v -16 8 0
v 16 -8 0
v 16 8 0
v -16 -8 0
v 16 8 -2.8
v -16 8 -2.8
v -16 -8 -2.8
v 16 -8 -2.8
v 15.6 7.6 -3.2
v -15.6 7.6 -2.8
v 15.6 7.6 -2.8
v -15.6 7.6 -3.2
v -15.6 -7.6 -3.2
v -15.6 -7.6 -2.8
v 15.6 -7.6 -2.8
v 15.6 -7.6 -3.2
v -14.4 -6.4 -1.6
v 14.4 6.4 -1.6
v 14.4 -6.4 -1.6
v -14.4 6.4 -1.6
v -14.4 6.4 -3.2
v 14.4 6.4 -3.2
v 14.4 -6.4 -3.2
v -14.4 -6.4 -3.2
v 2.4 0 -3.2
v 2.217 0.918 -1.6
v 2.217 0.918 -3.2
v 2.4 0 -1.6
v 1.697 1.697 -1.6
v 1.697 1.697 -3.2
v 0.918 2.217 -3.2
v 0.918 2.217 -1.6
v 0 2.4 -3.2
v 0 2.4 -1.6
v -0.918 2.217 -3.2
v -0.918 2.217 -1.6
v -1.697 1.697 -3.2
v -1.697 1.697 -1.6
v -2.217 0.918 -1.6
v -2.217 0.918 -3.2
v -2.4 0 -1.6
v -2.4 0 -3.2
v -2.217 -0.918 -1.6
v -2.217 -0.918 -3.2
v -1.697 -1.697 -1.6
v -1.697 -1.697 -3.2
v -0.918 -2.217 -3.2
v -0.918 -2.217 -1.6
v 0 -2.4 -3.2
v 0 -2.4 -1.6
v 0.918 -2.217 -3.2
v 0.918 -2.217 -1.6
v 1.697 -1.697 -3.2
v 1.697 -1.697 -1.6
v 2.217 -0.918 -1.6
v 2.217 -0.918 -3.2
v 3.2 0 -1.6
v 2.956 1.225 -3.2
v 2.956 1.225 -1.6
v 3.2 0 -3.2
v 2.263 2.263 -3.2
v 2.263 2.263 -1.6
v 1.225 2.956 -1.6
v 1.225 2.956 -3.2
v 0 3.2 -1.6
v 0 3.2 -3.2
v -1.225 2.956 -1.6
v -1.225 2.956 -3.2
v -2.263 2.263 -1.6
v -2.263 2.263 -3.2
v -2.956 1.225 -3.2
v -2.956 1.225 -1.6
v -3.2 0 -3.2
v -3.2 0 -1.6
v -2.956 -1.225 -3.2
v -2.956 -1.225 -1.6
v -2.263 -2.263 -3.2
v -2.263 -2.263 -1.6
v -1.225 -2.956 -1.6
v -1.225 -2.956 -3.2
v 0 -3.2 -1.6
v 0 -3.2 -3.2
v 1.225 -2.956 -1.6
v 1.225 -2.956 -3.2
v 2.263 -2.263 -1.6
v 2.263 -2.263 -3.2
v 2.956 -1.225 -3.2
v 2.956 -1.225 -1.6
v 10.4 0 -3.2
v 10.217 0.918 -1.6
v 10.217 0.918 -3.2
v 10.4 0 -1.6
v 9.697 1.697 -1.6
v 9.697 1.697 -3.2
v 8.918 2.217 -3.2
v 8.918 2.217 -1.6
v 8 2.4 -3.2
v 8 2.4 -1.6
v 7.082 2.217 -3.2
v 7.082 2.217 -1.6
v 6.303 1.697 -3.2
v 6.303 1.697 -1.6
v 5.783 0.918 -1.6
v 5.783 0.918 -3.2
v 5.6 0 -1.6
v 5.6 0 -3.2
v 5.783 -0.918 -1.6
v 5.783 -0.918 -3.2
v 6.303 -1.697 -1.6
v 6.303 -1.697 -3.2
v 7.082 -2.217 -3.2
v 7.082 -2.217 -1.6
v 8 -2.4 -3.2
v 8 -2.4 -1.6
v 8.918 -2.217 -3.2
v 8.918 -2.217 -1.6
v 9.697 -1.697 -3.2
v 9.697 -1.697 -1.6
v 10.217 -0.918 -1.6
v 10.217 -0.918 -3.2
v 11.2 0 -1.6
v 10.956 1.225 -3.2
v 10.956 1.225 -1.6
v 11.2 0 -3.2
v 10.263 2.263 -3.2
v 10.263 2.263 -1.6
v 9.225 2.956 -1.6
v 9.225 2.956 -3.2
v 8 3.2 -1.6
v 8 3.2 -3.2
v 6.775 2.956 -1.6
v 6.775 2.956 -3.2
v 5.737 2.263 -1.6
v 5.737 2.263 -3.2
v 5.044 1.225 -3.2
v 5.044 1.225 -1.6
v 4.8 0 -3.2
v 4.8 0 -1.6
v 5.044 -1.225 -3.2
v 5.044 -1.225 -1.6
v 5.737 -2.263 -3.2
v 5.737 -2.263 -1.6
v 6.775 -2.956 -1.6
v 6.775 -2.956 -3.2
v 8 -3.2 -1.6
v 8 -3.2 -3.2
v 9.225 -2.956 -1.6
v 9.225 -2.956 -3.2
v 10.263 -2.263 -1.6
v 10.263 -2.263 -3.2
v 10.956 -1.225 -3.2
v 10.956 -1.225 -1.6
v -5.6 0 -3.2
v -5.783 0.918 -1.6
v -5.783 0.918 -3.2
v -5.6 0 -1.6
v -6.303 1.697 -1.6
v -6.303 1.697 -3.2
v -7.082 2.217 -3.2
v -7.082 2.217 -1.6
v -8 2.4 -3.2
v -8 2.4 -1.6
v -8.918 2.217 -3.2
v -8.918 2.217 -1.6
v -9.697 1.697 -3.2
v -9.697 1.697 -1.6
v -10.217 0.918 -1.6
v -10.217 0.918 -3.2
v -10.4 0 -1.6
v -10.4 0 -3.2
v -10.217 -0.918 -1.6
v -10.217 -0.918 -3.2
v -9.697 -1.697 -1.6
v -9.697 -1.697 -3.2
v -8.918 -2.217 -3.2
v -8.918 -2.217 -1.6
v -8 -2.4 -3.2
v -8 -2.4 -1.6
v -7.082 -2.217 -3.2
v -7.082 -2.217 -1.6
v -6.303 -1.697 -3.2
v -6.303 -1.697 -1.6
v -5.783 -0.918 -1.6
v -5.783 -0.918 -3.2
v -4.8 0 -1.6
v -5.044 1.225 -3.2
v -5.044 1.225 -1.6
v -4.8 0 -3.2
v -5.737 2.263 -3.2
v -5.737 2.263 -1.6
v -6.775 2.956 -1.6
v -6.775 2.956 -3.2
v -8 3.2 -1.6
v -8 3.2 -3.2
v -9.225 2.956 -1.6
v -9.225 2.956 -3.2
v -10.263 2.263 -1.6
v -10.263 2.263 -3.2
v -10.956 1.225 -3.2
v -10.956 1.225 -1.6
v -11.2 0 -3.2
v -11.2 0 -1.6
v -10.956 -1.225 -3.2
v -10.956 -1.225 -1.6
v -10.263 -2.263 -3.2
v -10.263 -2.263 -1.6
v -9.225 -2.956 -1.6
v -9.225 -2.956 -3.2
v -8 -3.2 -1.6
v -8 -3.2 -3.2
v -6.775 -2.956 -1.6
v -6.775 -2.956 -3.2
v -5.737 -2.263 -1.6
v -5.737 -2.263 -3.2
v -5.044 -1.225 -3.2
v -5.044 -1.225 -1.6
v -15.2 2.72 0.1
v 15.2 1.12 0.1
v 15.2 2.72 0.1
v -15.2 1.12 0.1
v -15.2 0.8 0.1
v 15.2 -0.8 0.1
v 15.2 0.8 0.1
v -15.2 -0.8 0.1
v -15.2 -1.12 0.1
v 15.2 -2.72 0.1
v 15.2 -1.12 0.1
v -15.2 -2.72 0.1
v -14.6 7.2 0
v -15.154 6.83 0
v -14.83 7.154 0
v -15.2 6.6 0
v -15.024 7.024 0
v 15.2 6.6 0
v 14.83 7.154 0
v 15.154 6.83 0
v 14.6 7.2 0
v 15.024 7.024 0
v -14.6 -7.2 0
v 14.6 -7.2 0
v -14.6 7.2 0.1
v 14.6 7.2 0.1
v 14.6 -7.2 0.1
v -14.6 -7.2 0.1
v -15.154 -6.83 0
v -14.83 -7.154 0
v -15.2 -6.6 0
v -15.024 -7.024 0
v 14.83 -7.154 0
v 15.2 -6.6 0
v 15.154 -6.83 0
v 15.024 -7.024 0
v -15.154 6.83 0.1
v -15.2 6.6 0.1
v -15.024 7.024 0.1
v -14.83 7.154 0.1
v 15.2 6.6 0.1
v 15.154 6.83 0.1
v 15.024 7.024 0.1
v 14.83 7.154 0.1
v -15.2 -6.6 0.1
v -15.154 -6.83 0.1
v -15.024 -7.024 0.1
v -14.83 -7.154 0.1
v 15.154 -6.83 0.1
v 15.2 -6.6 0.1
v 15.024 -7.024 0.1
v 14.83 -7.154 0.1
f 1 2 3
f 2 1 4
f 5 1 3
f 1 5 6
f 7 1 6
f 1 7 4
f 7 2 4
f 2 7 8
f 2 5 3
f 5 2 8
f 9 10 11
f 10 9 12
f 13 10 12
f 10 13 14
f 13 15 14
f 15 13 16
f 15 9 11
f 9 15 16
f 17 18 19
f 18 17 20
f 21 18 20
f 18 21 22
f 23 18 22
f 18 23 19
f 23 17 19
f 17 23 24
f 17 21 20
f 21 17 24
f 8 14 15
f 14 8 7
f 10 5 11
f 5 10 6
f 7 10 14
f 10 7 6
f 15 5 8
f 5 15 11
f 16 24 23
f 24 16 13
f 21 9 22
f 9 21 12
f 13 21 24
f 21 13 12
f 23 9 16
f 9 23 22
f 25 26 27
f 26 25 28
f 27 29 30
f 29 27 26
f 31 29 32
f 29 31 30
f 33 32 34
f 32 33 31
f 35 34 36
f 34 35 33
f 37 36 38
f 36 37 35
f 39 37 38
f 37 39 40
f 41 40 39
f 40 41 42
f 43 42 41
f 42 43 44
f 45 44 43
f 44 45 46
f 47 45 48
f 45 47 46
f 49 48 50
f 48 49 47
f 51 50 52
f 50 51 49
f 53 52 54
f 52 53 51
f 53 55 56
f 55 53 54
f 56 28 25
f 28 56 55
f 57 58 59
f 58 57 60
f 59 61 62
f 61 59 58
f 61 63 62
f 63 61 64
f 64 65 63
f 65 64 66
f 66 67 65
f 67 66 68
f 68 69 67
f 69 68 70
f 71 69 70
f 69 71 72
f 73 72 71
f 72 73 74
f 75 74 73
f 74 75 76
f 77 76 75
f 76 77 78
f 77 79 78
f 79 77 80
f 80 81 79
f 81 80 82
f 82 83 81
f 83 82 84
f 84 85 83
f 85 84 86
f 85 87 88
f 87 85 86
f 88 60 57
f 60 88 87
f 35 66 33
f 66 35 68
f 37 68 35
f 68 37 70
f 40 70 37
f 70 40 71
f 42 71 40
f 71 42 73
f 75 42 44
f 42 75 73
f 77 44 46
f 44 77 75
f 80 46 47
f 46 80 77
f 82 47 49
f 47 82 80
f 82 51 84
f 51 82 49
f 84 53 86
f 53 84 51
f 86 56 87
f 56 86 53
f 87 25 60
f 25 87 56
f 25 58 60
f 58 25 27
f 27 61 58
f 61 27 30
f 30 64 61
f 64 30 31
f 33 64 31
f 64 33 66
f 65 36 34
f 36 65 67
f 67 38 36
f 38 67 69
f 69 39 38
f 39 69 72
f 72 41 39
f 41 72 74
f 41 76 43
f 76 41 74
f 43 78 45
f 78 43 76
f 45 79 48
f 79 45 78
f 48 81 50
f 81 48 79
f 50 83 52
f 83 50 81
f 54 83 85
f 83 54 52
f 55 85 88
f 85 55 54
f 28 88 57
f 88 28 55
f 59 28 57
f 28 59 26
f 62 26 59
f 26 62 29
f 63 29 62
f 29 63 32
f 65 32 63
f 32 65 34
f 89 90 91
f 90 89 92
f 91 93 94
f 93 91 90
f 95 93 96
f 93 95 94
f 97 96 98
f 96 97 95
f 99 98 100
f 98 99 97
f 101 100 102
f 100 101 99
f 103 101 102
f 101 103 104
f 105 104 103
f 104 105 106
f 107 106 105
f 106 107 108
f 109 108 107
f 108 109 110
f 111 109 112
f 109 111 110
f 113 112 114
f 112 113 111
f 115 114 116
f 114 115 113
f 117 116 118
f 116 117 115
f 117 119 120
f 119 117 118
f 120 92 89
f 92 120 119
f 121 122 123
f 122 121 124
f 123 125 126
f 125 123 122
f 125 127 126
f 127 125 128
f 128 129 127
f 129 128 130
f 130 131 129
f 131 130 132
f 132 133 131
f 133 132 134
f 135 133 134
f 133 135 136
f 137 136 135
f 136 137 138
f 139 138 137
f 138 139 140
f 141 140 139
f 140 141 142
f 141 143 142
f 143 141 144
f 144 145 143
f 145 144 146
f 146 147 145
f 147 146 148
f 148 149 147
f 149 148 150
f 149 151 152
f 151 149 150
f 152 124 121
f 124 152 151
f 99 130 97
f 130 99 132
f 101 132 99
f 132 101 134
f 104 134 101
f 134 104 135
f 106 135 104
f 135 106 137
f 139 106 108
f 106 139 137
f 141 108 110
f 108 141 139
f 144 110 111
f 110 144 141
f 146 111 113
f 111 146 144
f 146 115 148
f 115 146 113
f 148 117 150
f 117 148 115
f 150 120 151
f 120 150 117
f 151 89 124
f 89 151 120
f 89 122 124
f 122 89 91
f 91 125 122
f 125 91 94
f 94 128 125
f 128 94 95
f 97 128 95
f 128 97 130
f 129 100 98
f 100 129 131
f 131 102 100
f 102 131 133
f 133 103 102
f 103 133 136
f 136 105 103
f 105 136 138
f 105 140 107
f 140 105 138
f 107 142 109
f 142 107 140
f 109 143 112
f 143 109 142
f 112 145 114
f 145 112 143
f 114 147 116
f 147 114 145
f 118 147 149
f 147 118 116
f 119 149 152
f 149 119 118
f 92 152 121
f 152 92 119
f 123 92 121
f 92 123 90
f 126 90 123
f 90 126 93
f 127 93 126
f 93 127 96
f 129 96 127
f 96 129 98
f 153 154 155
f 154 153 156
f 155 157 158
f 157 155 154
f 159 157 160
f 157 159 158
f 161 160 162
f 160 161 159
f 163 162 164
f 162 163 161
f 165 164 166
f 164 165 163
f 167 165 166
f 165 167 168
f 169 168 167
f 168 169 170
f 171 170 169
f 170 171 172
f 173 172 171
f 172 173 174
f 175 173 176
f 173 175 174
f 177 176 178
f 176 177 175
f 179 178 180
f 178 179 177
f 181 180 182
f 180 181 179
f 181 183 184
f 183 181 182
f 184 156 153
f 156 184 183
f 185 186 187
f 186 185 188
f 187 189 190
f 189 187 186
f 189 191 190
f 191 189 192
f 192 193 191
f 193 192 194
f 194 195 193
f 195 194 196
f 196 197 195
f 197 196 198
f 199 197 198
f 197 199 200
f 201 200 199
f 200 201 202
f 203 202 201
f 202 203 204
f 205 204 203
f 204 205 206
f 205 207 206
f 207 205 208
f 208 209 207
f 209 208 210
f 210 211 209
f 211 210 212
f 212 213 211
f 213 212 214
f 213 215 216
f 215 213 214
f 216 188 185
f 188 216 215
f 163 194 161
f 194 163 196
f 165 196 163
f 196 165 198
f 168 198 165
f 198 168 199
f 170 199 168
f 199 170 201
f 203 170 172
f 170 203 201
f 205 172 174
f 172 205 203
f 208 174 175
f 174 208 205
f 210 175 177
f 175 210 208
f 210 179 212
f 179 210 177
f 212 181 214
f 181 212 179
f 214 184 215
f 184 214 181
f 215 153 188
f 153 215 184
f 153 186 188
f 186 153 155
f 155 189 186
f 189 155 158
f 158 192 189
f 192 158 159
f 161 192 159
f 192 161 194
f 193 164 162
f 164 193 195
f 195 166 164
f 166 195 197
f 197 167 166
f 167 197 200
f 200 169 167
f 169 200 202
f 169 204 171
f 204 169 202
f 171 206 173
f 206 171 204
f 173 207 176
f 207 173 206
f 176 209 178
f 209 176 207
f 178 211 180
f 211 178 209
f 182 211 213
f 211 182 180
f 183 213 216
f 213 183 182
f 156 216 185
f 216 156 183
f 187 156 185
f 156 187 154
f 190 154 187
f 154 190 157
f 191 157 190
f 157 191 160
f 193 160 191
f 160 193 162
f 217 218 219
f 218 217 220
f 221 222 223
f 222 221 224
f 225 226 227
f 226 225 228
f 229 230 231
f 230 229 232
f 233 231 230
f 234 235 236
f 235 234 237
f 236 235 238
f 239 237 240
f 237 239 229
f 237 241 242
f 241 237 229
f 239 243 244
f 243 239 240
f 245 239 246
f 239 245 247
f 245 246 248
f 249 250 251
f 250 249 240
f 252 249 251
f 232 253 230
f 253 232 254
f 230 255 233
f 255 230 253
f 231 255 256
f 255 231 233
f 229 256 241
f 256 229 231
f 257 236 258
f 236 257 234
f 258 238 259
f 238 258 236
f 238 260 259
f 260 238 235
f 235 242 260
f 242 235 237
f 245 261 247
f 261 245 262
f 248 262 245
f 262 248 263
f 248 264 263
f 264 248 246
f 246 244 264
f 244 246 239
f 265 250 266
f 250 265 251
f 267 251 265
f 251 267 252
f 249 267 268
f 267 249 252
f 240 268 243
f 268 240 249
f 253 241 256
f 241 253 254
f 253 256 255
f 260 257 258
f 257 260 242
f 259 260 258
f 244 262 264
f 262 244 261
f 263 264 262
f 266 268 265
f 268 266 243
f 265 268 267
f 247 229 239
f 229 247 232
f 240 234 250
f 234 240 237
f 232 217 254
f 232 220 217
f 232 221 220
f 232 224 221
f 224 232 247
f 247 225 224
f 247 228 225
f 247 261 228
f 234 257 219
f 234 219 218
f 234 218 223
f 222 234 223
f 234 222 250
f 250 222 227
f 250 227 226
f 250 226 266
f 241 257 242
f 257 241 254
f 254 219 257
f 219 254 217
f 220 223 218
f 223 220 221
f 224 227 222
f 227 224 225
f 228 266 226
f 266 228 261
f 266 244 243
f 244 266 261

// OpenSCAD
// file: ../p/4-4ring3.scad
use <../lib.scad>
$fa=1; $fs=0.2;
function ldraw_lib__4_4ring3(realsolid=false) = [
// 0 Ring  3 x 1.0
// 0 Name: 4-4ring3.dat
// 0 Author: James Jessiman
// 0 !LDRAW_ORG Primitive UPDATE 2009-01
// 0 !LICENSE Licensed under CC BY 2.0 and CC BY 4.0 : see CAreadme.txt
// 
// 0 BFC CERTIFY CCW
  [0,"BFC","CERTIFY"],
  [0,"BFC","CCW"],
// 
// 0 !HISTORY 1998-12-15 [PTadmin] Official Update 1998-10
// 0 !HISTORY 2002-04-05 [hafhead] Added BFC statement
// 0 !HISTORY 2002-04-25 [PTadmin] Official Update 2002-02
// 0 !HISTORY 2007-06-24 [PTadmin] Header formatted for Contributor Agreement
// 0 !HISTORY 2008-07-01 [PTadmin] Official Update 2008-01
// 0 !HISTORY 2008-08-26 [cwdee] Switch polygon winding and rename
// 0 !HISTORY 2009-05-02 [PTadmin] Official Update 2009-01
// 
// 
// 4 16 -1.5308 0 3.6956 -1.1481 0 2.7717 0 0 3 0 0 4
  [4,16,-1.5308,0,3.6956,-1.1481,0,2.7717,0,0,3,0,0,4],
// 4 16 -2.8284 0 2.8284 -2.1213 0 2.1213 -1.1481 0 2.7717 -1.5308 0 3.6956
  [4,16,-2.8284,0,2.8284,-2.1213,0,2.1213,-1.1481,0,2.7717,-1.5308,0,3.6956],
// 4 16 -3.6956 0 1.5308 -2.7717 0 1.1481 -2.1213 0 2.1213 -2.8284 0 2.8284
  [4,16,-3.6956,0,1.5308,-2.7717,0,1.1481,-2.1213,0,2.1213,-2.8284,0,2.8284],
// 4 16 -4 0 0 -3 0 0 -2.7717 0 1.1481 -3.6956 0 1.5308
  [4,16,-4,0,0,-3,0,0,-2.7717,0,1.1481,-3.6956,0,1.5308],
// 4 16 -3.6956 0 -1.5308 -2.7717 0 -1.1481 -3 0 0 -4 0 0
  [4,16,-3.6956,0,-1.5308,-2.7717,0,-1.1481,-3,0,0,-4,0,0],
// 4 16 -2.8284 0 -2.8284 -2.1213 0 -2.1213 -2.7717 0 -1.1481 -3.6956 0 -1.5308
  [4,16,-2.8284,0,-2.8284,-2.1213,0,-2.1213,-2.7717,0,-1.1481,-3.6956,0,-1.5308],
// 4 16 -1.5308 0 -3.6956 -1.1481 0 -2.7717 -2.1213 0 -2.1213 -2.8284 0 -2.8284
  [4,16,-1.5308,0,-3.6956,-1.1481,0,-2.7717,-2.1213,0,-2.1213,-2.8284,0,-2.8284],
// 4 16 0 0 -4 0 0 -3 -1.1481 0 -2.7717 -1.5308 0 -3.6956
  [4,16,0,0,-4,0,0,-3,-1.1481,0,-2.7717,-1.5308,0,-3.6956],
// 4 16 1.5308 0 -3.6956 1.1481 0 -2.7717 0 0 -3 0 0 -4
  [4,16,1.5308,0,-3.6956,1.1481,0,-2.7717,0,0,-3,0,0,-4],
// 4 16 2.8284 0 -2.8284 2.1213 0 -2.1213 1.1481 0 -2.7717 1.5308 0 -3.6956
  [4,16,2.8284,0,-2.8284,2.1213,0,-2.1213,1.1481,0,-2.7717,1.5308,0,-3.6956],
// 4 16 3.6956 0 -1.5308 2.7717 0 -1.1481 2.1213 0 -2.1213 2.8284 0 -2.8284
  [4,16,3.6956,0,-1.5308,2.7717,0,-1.1481,2.1213,0,-2.1213,2.8284,0,-2.8284],
// 4 16 4 0 0 3 0 0 2.7717 0 -1.1481 3.6956 0 -1.5308
  [4,16,4,0,0,3,0,0,2.7717,0,-1.1481,3.6956,0,-1.5308],
// 4 16 3.6956 0 1.5308 2.7717 0 1.1481 3 0 0 4 0 0
  [4,16,3.6956,0,1.5308,2.7717,0,1.1481,3,0,0,4,0,0],
// 4 16 2.8284 0 2.8284 2.1213 0 2.1213 2.7717 0 1.1481 3.6956 0 1.5308
  [4,16,2.8284,0,2.8284,2.1213,0,2.1213,2.7717,0,1.1481,3.6956,0,1.5308],
// 4 16 1.5308 0 3.6956 1.1481 0 2.7717 2.1213 0 2.1213 2.8284 0 2.8284
  [4,16,1.5308,0,3.6956,1.1481,0,2.7717,2.1213,0,2.1213,2.8284,0,2.8284],
// 4 16 0 0 4 0 0 3 1.1481 0 2.7717 1.5308 0 3.6956
  [4,16,0,0,4,0,0,3,1.1481,0,2.7717,1.5308,0,3.6956],
// 0
];
module ldraw_lib__4_4ring3(step=0, col=false, unit=2/5, alt=false, line=0.2, solid=!$preview)
    makepoly(ldraw_lib__4_4ring3(solid), step=step, col=col, unit=unit, alt=alt, line=line, solid=solid);
ldraw_lib__4_4ring3(line=0.2);
// file: ../p/4-4edge.scad
use <../lib.scad>
function ldraw_lib__4_4edge() = [
// 0 Circle 1.0
// 0 Name: 4-4edge.dat
// 0 Author: James Jessiman
// 0 !LDRAW_ORG Primitive UPDATE 2017-01
// 0 !LICENSE Licensed under CC BY 2.0 and CC BY 4.0 : see CAreadme.txt
// 
// 0 BFC CERTIFY CCW
  [0,"BFC","CERTIFY"],
  [0,"BFC","CCW"],
// 
// 0 !HISTORY 1998-12-15 [PTadmin] Official Update 1998-10
// 0 !HISTORY 2005-12-28 [PTadmin] Official Update 2005-01
// 0 !HISTORY 2007-06-24 [PTadmin] Header formatted for Contributor Agreement
// 0 !HISTORY 2008-07-01 [PTadmin] Official Update 2008-01
// 0 !HISTORY 2017-01-15 [Steffen] BFCed
// 0 !HISTORY 2017-12-30 [PTadmin] Official Update 2017-01
// 
// 
// 2 24 1 0 0 0.9239 0 0.3827
  [2,24,1,0,0,0.9239,0,0.3827],
// 2 24 0.9239 0 0.3827 0.7071 0 0.7071
  [2,24,0.9239,0,0.3827,0.7071,0,0.7071],
// 2 24 0.7071 0 0.7071 0.3827 0 0.9239
  [2,24,0.7071,0,0.7071,0.3827,0,0.9239],
// 2 24 0.3827 0 0.9239 0 0 1
  [2,24,0.3827,0,0.9239,0,0,1],
// 2 24 0 0 1 -0.3827 0 0.9239
  [2,24,0,0,1,-0.3827,0,0.9239],
// 2 24 -0.3827 0 0.9239 -0.7071 0 0.7071
  [2,24,-0.3827,0,0.9239,-0.7071,0,0.7071],
// 2 24 -0.7071 0 0.7071 -0.9239 0 0.3827
  [2,24,-0.7071,0,0.7071,-0.9239,0,0.3827],
// 2 24 -0.9239 0 0.3827 -1 0 -0
  [2,24,-0.9239,0,0.3827,-1,0,-0],
// 2 24 -1 0 -0 -0.9239 0 -0.3827
  [2,24,-1,0,-0,-0.9239,0,-0.3827],
// 2 24 -0.9239 0 -0.3827 -0.7071 0 -0.7071
  [2,24,-0.9239,0,-0.3827,-0.7071,0,-0.7071],
// 2 24 -0.7071 0 -0.7071 -0.3827 0 -0.9239
  [2,24,-0.7071,0,-0.7071,-0.3827,0,-0.9239],
// 2 24 -0.3827 0 -0.9239 0 0 -1
  [2,24,-0.3827,0,-0.9239,0,0,-1],
// 2 24 0 0 -1 0.3827 0 -0.9239
  [2,24,0,0,-1,0.3827,0,-0.9239],
// 2 24 0.3827 0 -0.9239 0.7071 0 -0.7071
  [2,24,0.3827,0,-0.9239,0.7071,0,-0.7071],
// 2 24 0.7071 0 -0.7071 0.9239 0 -0.3827
  [2,24,0.7071,0,-0.7071,0.9239,0,-0.3827],
// 2 24 0.9239 0 -0.3827 1 0 0
  [2,24,0.9239,0,-0.3827,1,0,0],
];
module ldraw_lib__4_4edge(step=0, col=false, unit=2/5, alt=false, line=0.2, solid=!$preview)
    makepoly(ldraw_lib__4_4edge(), step=step, col=col, unit=unit, alt=alt, line=line, solid=solid);
ldraw_lib__4_4edge(line=0.2);
// file: ../p/4-4cyli.scad
use <../lib.scad>
$fa=1; $fs=0.2;
function ldraw_lib__4_4cyli(realsolid=false) = [
// 0 Cylinder 1.0
// 0 Name: 4-4cyli.dat
// 0 Author: James Jessiman
// 0 !LDRAW_ORG Primitive UPDATE 2005-01
// 0 !LICENSE Licensed under CC BY 2.0 and CC BY 4.0 : see CAreadme.txt
// 
// 0 BFC CERTIFY CCW
  [0,"BFC","CERTIFY"],
  [0,"BFC","CCW"],
// 
// 0 !HISTORY 1998-12-15 [PTadmin] Official Update 1998-10
// 0 !HISTORY 2002-03-23 [sbliss] Added BFC statement; merged headers from files in distributions LDraw 0.27 and Complete.
// 0 !HISTORY 2002-04-25 [PTadmin] Official Update 2002-02
// 0 !HISTORY 2004-12-14 [guyvivan] BFC CCW
// 0 !HISTORY 2005-12-28 [PTadmin] Official Update 2005-01
// 0 !HISTORY 2007-06-24 [PTadmin] Header formatted for Contributor Agreement
// 0 !HISTORY 2008-07-01 [PTadmin] Official Update 2008-01
// 
// 
// 4 16 1 1 0 0.9239 1 0.3827 0.9239 0 0.3827 1 0 0
  [4,16,1,1,0,0.9239,1,0.3827,0.9239,0,0.3827,1,0,0],
// 5 24 1 0 0 1 1 0 0.9239 0 0.3827 0.9239 0 -0.3827
  [5,24,1,0,0,1,1,0,0.9239,0,0.3827,0.9239,0,-0.3827],
// 4 16 0.9239 1 0.3827 0.7071 1 0.7071 0.7071 0 0.7071 0.9239 0 0.3827
  [4,16,0.9239,1,0.3827,0.7071,1,0.7071,0.7071,0,0.7071,0.9239,0,0.3827],
// 5 24 0.9239 0 0.3827 0.9239 1 0.3827 0.7071 0 0.7071 1 0 0
  [5,24,0.9239,0,0.3827,0.9239,1,0.3827,0.7071,0,0.7071,1,0,0],
// 4 16 0.7071 1 0.7071 0.3827 1 0.9239 0.3827 0 0.9239 0.7071 0 0.7071
  [4,16,0.7071,1,0.7071,0.3827,1,0.9239,0.3827,0,0.9239,0.7071,0,0.7071],
// 5 24 0.7071 0 0.7071 0.7071 1 0.7071 0.3827 0 0.9239 0.9239 0 0.3827
  [5,24,0.7071,0,0.7071,0.7071,1,0.7071,0.3827,0,0.9239,0.9239,0,0.3827],
// 4 16 0.3827 1 0.9239 0 1 1 0 0 1 0.3827 0 0.9239
  [4,16,0.3827,1,0.9239,0,1,1,0,0,1,0.3827,0,0.9239],
// 5 24 0.3827 0 0.9239 0.3827 1 0.9239 0 0 1 0.7071 0 0.7071
  [5,24,0.3827,0,0.9239,0.3827,1,0.9239,0,0,1,0.7071,0,0.7071],
// 4 16 0 1 1 -0.3827 1 0.9239 -0.3827 0 0.9239 0 0 1
  [4,16,0,1,1,-0.3827,1,0.9239,-0.3827,0,0.9239,0,0,1],
// 5 24 0 0 1 0 1 1 -0.3827 0 0.9239 0.3827 0 0.9239
  [5,24,0,0,1,0,1,1,-0.3827,0,0.9239,0.3827,0,0.9239],
// 4 16 -0.3827 1 0.9239 -0.7071 1 0.7071 -0.7071 0 0.7071 -0.3827 0 0.9239
  [4,16,-0.3827,1,0.9239,-0.7071,1,0.7071,-0.7071,0,0.7071,-0.3827,0,0.9239],
// 5 24 -0.3827 0 0.9239 -0.3827 1 0.9239 -0.7071 0 0.7071 0 0 1
  [5,24,-0.3827,0,0.9239,-0.3827,1,0.9239,-0.7071,0,0.7071,0,0,1],
// 4 16 -0.7071 1 0.7071 -0.9239 1 0.3827 -0.9239 0 0.3827 -0.7071 0 0.7071
  [4,16,-0.7071,1,0.7071,-0.9239,1,0.3827,-0.9239,0,0.3827,-0.7071,0,0.7071],
// 5 24 -0.7071 0 0.7071 -0.7071 1 0.7071 -0.9239 0 0.3827 -0.3827 0 0.9239
  [5,24,-0.7071,0,0.7071,-0.7071,1,0.7071,-0.9239,0,0.3827,-0.3827,0,0.9239],
// 4 16 -0.9239 1 0.3827 -1 1 0 -1 0 0 -0.9239 0 0.3827
  [4,16,-0.9239,1,0.3827,-1,1,0,-1,0,0,-0.9239,0,0.3827],
// 5 24 -0.9239 0 0.3827 -0.9239 1 0.3827 -1 0 0 -0.7071 0 0.7071
  [5,24,-0.9239,0,0.3827,-0.9239,1,0.3827,-1,0,0,-0.7071,0,0.7071],
// 4 16 -1 1 0 -0.9239 1 -0.3827 -0.9239 0 -0.3827 -1 0 0
  [4,16,-1,1,0,-0.9239,1,-0.3827,-0.9239,0,-0.3827,-1,0,0],
// 5 24 -1 0 0 -1 1 0 -0.9239 0 -0.3827 -0.9239 0 0.3827
  [5,24,-1,0,0,-1,1,0,-0.9239,0,-0.3827,-0.9239,0,0.3827],
// 4 16 -0.9239 1 -0.3827 -0.7071 1 -0.7071 -0.7071 0 -0.7071 -0.9239 0 -0.3827
  [4,16,-0.9239,1,-0.3827,-0.7071,1,-0.7071,-0.7071,0,-0.7071,-0.9239,0,-0.3827],
// 5 24 -0.9239 0 -0.3827 -0.9239 1 -0.3827 -0.7071 0 -0.7071 -1 0 0
  [5,24,-0.9239,0,-0.3827,-0.9239,1,-0.3827,-0.7071,0,-0.7071,-1,0,0],
// 4 16 -0.7071 1 -0.7071 -0.3827 1 -0.9239 -0.3827 0 -0.9239 -0.7071 0 -0.7071
  [4,16,-0.7071,1,-0.7071,-0.3827,1,-0.9239,-0.3827,0,-0.9239,-0.7071,0,-0.7071],
// 5 24 -0.7071 0 -0.7071 -0.7071 1 -0.7071 -0.3827 0 -0.9239 -0.9239 0 -0.3827
  [5,24,-0.7071,0,-0.7071,-0.7071,1,-0.7071,-0.3827,0,-0.9239,-0.9239,0,-0.3827],
// 4 16 -0.3827 1 -0.9239 0 1 -1 0 0 -1 -0.3827 0 -0.9239
  [4,16,-0.3827,1,-0.9239,0,1,-1,0,0,-1,-0.3827,0,-0.9239],
// 5 24 -0.3827 0 -0.9239 -0.3827 1 -0.9239 0 0 -1 -0.7071 0 -0.7071
  [5,24,-0.3827,0,-0.9239,-0.3827,1,-0.9239,0,0,-1,-0.7071,0,-0.7071],
// 4 16 0 1 -1 0.3827 1 -0.9239 0.3827 0 -0.9239 0 0 -1
  [4,16,0,1,-1,0.3827,1,-0.9239,0.3827,0,-0.9239,0,0,-1],
// 5 24 0 0 -1 0 1 -1 0.3827 0 -0.9239 -0.3827 0 -0.9239
  [5,24,0,0,-1,0,1,-1,0.3827,0,-0.9239,-0.3827,0,-0.9239],
// 4 16 0.3827 1 -0.9239 0.7071 1 -0.7071 0.7071 0 -0.7071 0.3827 0 -0.9239
  [4,16,0.3827,1,-0.9239,0.7071,1,-0.7071,0.7071,0,-0.7071,0.3827,0,-0.9239],
// 5 24 0.3827 0 -0.9239 0.3827 1 -0.9239 0.7071 0 -0.7071 0 0 -1
  [5,24,0.3827,0,-0.9239,0.3827,1,-0.9239,0.7071,0,-0.7071,0,0,-1],
// 4 16 0.7071 1 -0.7071 0.9239 1 -0.3827 0.9239 0 -0.3827 0.7071 0 -0.7071
  [4,16,0.7071,1,-0.7071,0.9239,1,-0.3827,0.9239,0,-0.3827,0.7071,0,-0.7071],
// 5 24 0.7071 0 -0.7071 0.7071 1 -0.7071 0.9239 0 -0.3827 0.3827 0 -0.9239
  [5,24,0.7071,0,-0.7071,0.7071,1,-0.7071,0.9239,0,-0.3827,0.3827,0,-0.9239],
// 4 16 0.9239 1 -0.3827 1 1 0 1 0 0 0.9239 0 -0.3827
  [4,16,0.9239,1,-0.3827,1,1,0,1,0,0,0.9239,0,-0.3827],
// 5 24 0.9239 0 -0.3827 0.9239 1 -0.3827 1 0 0 0.7071 0 -0.7071
  [5,24,0.9239,0,-0.3827,0.9239,1,-0.3827,1,0,0,0.7071,0,-0.7071],
// 0
];
module ldraw_lib__4_4cyli(step=0, col=false, unit=2/5, alt=false, line=0.2, solid=!$preview)
    makepoly(ldraw_lib__4_4cyli(solid), step=step, col=col, unit=unit, alt=alt, line=line, solid=solid);
ldraw_lib__4_4cyli(line=0.2);
// file: ../p/stud4.scad
use <../lib.scad>
use <4-4cyli.scad>
use <4-4edge.scad>
use <4-4ring3.scad>
function ldraw_lib__stud4() = [
// 0 Stud Tube Open
// 0 Name: stud4.dat
// 0 Author: James Jessiman
// 0 !LDRAW_ORG Primitive UPDATE 2009-02
// 0 !LICENSE Licensed under CC BY 4.0 : see CAreadme.txt
// 
// 0 BFC CERTIFY CCW
  [0,"BFC","CERTIFY"],
  [0,"BFC","CCW"],
// 
// 0 !HISTORY 1999-07-05 [PTadmin] Official Update 1999-05
// 0 !HISTORY 2002-04-04 [sbliss] Modified for BFC compliance
// 0 !HISTORY 2002-04-25 [PTadmin] Official Update 2002-02
// 0 !HISTORY 2007-06-24 [PTadmin] Header formatted for Contributor Agreement
// 0 !HISTORY 2008-07-01 [PTadmin] Official Update 2008-01
// 0 !HISTORY 2009-06-21 [cwdee] Update ring references to 4-4ring
// 0 !HISTORY 2009-09-03 [PTadmin] Official Update 2009-02
// 
// 
// 1 16 0 -4 0 6 0 0 0 1 0 0 0 6 4-4edge.dat
  [1,16,0,-4,0,6,0,0,0,1,0,0,0,6, ldraw_lib__4_4edge()],
// 1 16 0 -4 0 8 0 0 0 1 0 0 0 8 4-4edge.dat
  [1,16,0,-4,0,8,0,0,0,1,0,0,0,8, ldraw_lib__4_4edge()],
// 1 16 0 0 0 6 0 0 0 1 0 0 0 6 4-4edge.dat
  [1,16,0,0,0,6,0,0,0,1,0,0,0,6, ldraw_lib__4_4edge()],
// 1 16 0 0 0 8 0 0 0 1 0 0 0 8 4-4edge.dat
  [1,16,0,0,0,8,0,0,0,1,0,0,0,8, ldraw_lib__4_4edge()],
// 0 BFC INVERTNEXT
  [0,"BFC","INVERTNEXT"],
// 1 16 0 -4 0 6 0 0 0 4 0 0 0 6 4-4cyli.dat
  [1,16,0,-4,0,6,0,0,0,4,0,0,0,6, ldraw_lib__4_4cyli()],
// 1 16 0 -4 0 8 0 0 0 4 0 0 0 8 4-4cyli.dat
  [1,16,0,-4,0,8,0,0,0,4,0,0,0,8, ldraw_lib__4_4cyli()],
// 1 16 0 -4 0 2 0 0 0 1 0 0 0 2 4-4ring3.dat
  [1,16,0,-4,0,2,0,0,0,1,0,0,0,2, ldraw_lib__4_4ring3()],
  [-1,16,0,0,0,2,0,0,0,-1,0,0,0,2, ldraw_lib__4_4ring3()],
// 0
];
module ldraw_lib__stud4(step=0, col=false, unit=2/5, alt=false, line=0.2, solid=!$preview)
    makepoly(ldraw_lib__stud4(), step=step, col=col, unit=unit, alt=alt, line=line, solid=solid);
ldraw_lib__stud4(line=0.2);
// file: ../p/box5.scad
use <../lib.scad>
function ldraw_lib__box5() = [
// 0 Box with 5 Faces and All Edges
// 0 Name: box5.dat
// 0 Author: James Jessiman
// 0 !LDRAW_ORG Primitive UPDATE 2012-01
// 0 !LICENSE Licensed under CC BY 2.0 and CC BY 4.0 : see CAreadme.txt
// 
// 0 BFC CERTIFY CCW
  [0,"BFC","CERTIFY"],
  [0,"BFC","CCW"],
// 
// 0 !HISTORY 2002-04-03 [sbliss] Modified for BFC compliance
// 0 !HISTORY 2002-04-25 [PTadmin] Official Update 2002-02
// 0 !HISTORY 2007-06-24 [PTadmin] Header formatted for Contributor Agreement
// 0 !HISTORY 2008-07-01 [PTadmin] Official Update 2008-01
// 0 !HISTORY 2012-02-16 [Philo] Changed to CCW
// 0 !HISTORY 2012-03-30 [PTadmin] Official Update 2012-01
// 
// 
// 2 24 1 1 1 -1 1 1
  [2,24,1,1,1,-1,1,1],
// 2 24 -1 1 1 -1 1 -1
  [2,24,-1,1,1,-1,1,-1],
// 2 24 -1 1 -1 1 1 -1
  [2,24,-1,1,-1,1,1,-1],
// 2 24 1 1 -1 1 1 1
  [2,24,1,1,-1,1,1,1],
// 2 24 1 0 1 -1 0 1
  [2,24,1,0,1,-1,0,1],
// 2 24 -1 0 1 -1 0 -1
  [2,24,-1,0,1,-1,0,-1],
// 2 24 -1 0 -1 1 0 -1
  [2,24,-1,0,-1,1,0,-1],
// 2 24 1 0 -1 1 0 1
  [2,24,1,0,-1,1,0,1],
// 2 24 1 0 1 1 1 1
  [2,24,1,0,1,1,1,1],
// 2 24 -1 0 1 -1 1 1
  [2,24,-1,0,1,-1,1,1],
// 2 24 1 0 -1 1 1 -1
  [2,24,1,0,-1,1,1,-1],
// 2 24 -1 0 -1 -1 1 -1
  [2,24,-1,0,-1,-1,1,-1],
// 4 16 -1 1 1 1 1 1 1 1 -1 -1 1 -1
  [4,16,-1,1,1,1,1,1,1,1,-1,-1,1,-1],
// 4 16 -1 1 1 -1 0 1 1 0 1 1 1 1
  [4,16,-1,1,1,-1,0,1,1,0,1,1,1,1],
// 4 16 -1 1 -1 -1 0 -1 -1 0 1 -1 1 1
  [4,16,-1,1,-1,-1,0,-1,-1,0,1,-1,1,1],
// 4 16 1 1 -1 1 0 -1 -1 0 -1 -1 1 -1
  [4,16,1,1,-1,1,0,-1,-1,0,-1,-1,1,-1],
// 4 16 1 1 1 1 0 1 1 0 -1 1 1 -1
  [4,16,1,1,1,1,0,1,1,0,-1,1,1,-1],
];
makepoly(ldraw_lib__box5(), line=0.2);
// file: ../p/box4.scad
use <../lib.scad>
function ldraw_lib__box4() = [
// 0 Box with 4 Faces (2 Parallel Pairs) and All Edges
// 0 Name: box4.dat
// 0 Author: James Jessiman
// 0 !LDRAW_ORG Primitive UPDATE 2012-01
// 0 !LICENSE Licensed under CC BY 4.0 : see CAreadme.txt
// 
// 0 BFC CERTIFY CCW
  [0,"BFC","CERTIFY"],
  [0,"BFC","CCW"],
// 
// 0 !HISTORY 2002-04-03 [sbliss] Modified for BFC compliance
// 0 !HISTORY 2002-04-25 [PTadmin] Official Update 2002-02
// 0 !HISTORY 2007-06-24 [PTadmin] Header formatted for Contributor Agreement
// 0 !HISTORY 2008-07-01 [PTadmin] Official Update 2008-01
// 0 !HISTORY 2012-02-16 [Philo] Changed to CCW
// 0 !HISTORY 2012-03-30 [PTadmin] Official Update 2012-01
// 
// 
// 2 24 1 1 1 -1 1 1
  [2,24,1,1,1,-1,1,1],
// 2 24 -1 1 1 -1 1 -1
  [2,24,-1,1,1,-1,1,-1],
// 2 24 -1 1 -1 1 1 -1
  [2,24,-1,1,-1,1,1,-1],
// 2 24 1 1 -1 1 1 1
  [2,24,1,1,-1,1,1,1],
// 2 24 1 0 1 -1 0 1
  [2,24,1,0,1,-1,0,1],
// 2 24 -1 0 1 -1 0 -1
  [2,24,-1,0,1,-1,0,-1],
// 2 24 -1 0 -1 1 0 -1
  [2,24,-1,0,-1,1,0,-1],
// 2 24 1 0 -1 1 0 1
  [2,24,1,0,-1,1,0,1],
// 2 24 1 0 1 1 1 1
  [2,24,1,0,1,1,1,1],
// 2 24 -1 0 1 -1 1 1
  [2,24,-1,0,1,-1,1,1],
// 2 24 1 0 -1 1 1 -1
  [2,24,1,0,-1,1,1,-1],
// 2 24 -1 0 -1 -1 1 -1
  [2,24,-1,0,-1,-1,1,-1],
// 4 16 -1 1 1 -1 0 1 1 0 1 1 1 1
  [4,16,-1,1,1,-1,0,1,1,0,1,1,1,1],
// 4 16 -1 1 -1 -1 0 -1 -1 0 1 -1 1 1
  [4,16,-1,1,-1,-1,0,-1,-1,0,1,-1,1,1],
// 4 16 1 1 -1 1 0 -1 -1 0 -1 -1 1 -1
  [4,16,1,1,-1,1,0,-1,-1,0,-1,-1,1,-1],
// 4 16 1 1 1 1 0 1 1 0 -1 1 1 -1
  [4,16,1,1,1,1,0,1,1,0,-1,1,1,-1],
];
module ldraw_lib__box4(step=0, col=false, unit=2/5, alt=false, line=0.2, solid=!$preview)
    makepoly(ldraw_lib__box4(), step=step, col=col, unit=unit, alt=alt, line=line, solid=solid);
ldraw_lib__box4(line=0.2);
// file: s/87079s01.scad
use <../../lib.scad>
use <../../p/box4.scad>
use <../../p/box5.scad>
use <../../p/stud4.scad>
function ldraw_lib__s__87079s01() = [
// 0 ~Tile  2 x  4 with Groove without Top
// 0 Name: s\87079s01.dat
// 0 Author: Philippe Hurbain [Philo]
// 0 !LDRAW_ORG Subpart UPDATE 2012-03
// 0 !LICENSE Licensed under CC BY 4.0 : see CAreadme.txt
// 
// 0 BFC CERTIFY CCW
  [0,"BFC","CERTIFY"],
  [0,"BFC","CCW"],
// 
// 0 !HISTORY 2012-09-30 [Philo] Subparted from Tim Gould's original design
// 0 !HISTORY 2012-12-28 [PTadmin] Official Update 2012-03
// 
// 
// 1 16 0 0 0 40 0 0 0 7 0 0 0 20 box4.dat
  [1,16,0,0,0,40,0,0,0,7,0,0,0,20, ldraw_lib__box4()],
// 1 16 0 7 0 39 0 0 0 1 0 0 0 19 box4.dat
  [1,16,0,7,0,39,0,0,0,1,0,0,0,19, ldraw_lib__box4()],
// 0 BFC INVERTNEXT
  [0,"BFC","INVERTNEXT"],
// 1 16 0 8 0 -36 0 0 0 -4 0 0 0 16 box5.dat
  [1,16,0,8,0,-36,0,0,0,-4,0,0,0,16, ldraw_lib__box5()],
// 4 16 -40 7 -20 -39 7 -19 39 7 -19 40 7 -20
  [4,16,-40,7,-20,-39,7,-19,39,7,-19,40,7,-20],
// 4 16 40 7 20 39 7 19 -39 7 19 -40 7 20
  [4,16,40,7,20,39,7,19,-39,7,19,-40,7,20],
// 4 16 -40 7 -20 -40 7 20 -39 7 19 -39 7 -19
  [4,16,-40,7,-20,-40,7,20,-39,7,19,-39,7,-19],
// 4 16 40 7 20 40 7 -20 39 7 -19 39 7 19
  [4,16,40,7,20,40,7,-20,39,7,-19,39,7,19],
// 4 16 -39 8 -19 -36 8 -16 36 8 -16 39 8 -19
  [4,16,-39,8,-19,-36,8,-16,36,8,-16,39,8,-19],
// 4 16 39 8 19 36 8 16 -36 8 16 -39 8 19
  [4,16,39,8,19,36,8,16,-36,8,16,-39,8,19],
// 4 16 -39 8 -19 -39 8 19 -36 8 16 -36 8 -16
  [4,16,-39,8,-19,-39,8,19,-36,8,16,-36,8,-16],
// 4 16 39 8 19 39 8 -19 36 8 -16 36 8 16
  [4,16,39,8,19,39,8,-19,36,8,-16,36,8,16],
// 1 16 0 4 0 1 0 0 0 -1 0 0 0 1 stud4.dat
  [1,16,0,4,0,1,0,0,0,-1,0,0,0,1, ldraw_lib__stud4()],
// 1 16 20 4 0 1 0 0 0 -1 0 0 0 1 stud4.dat
  [1,16,20,4,0,1,0,0,0,-1,0,0,0,1, ldraw_lib__stud4()],
// 1 16 -20 4 0 1 0 0 0 -1 0 0 0 1 stud4.dat
  [1,16,-20,4,0,1,0,0,0,-1,0,0,0,1, ldraw_lib__stud4()],
];
module ldraw_lib__s__87079s01(step=0, col=false, unit=2/5, alt=false, line=0.2, solid=!$preview)
    makepoly(ldraw_lib__s__87079s01(), step=step, col=col, unit=unit, alt=alt, line=line, solid=solid);
ldraw_lib__s__87079s01(line=0.2);
// file: ../p/box3u12.scad
use <../lib.scad>
function ldraw_lib__box3u12() = [
// 0 Box with 3 Parallel Faces without Any Edges
// 0 Name: box3u12.dat
// 0 Author: J.C. Tchang [tchang]
// 0 !LDRAW_ORG Primitive UPDATE 2014-02
// 0 !LICENSE Licensed under CC BY 2.0 and CC BY 4.0 : see CAreadme.txt
// 
// 0 BFC CERTIFY CCW
  [0,"BFC","CERTIFY"],
  [0,"BFC","CCW"],
// 
// 0 !HISTORY 2014-12-23 [PTadmin] Official Update 2014-02
// 
// 
// 4 16 -1 1 1 1 1 1 1 1 -1 -1 1 -1
  [4,16,-1,1,1,1,1,1,1,1,-1,-1,1,-1],
// 4 16 -1 1 1 -1 0 1 1 0 1 1 1 1
  [4,16,-1,1,1,-1,0,1,1,0,1,1,1,1],
// 4 16 1 1 -1 1 0 -1 -1 0 -1 -1 1 -1
  [4,16,1,1,-1,1,0,-1,-1,0,-1,-1,1,-1],
];
makepoly(ldraw_lib__box3u12(), line=0.2);
// file: ../p/1-4cyli.scad
use <../lib.scad>
function ldraw_lib__1_4cyli() = [
// 0 Cylinder 0.25
// 0 Name: 1-4cyli.dat
// 0 Author: James Jessiman
// 0 !LDRAW_ORG Primitive UPDATE 2012-01
// 0 !LICENSE Licensed under CC BY 2.0 and CC BY 4.0 : see CAreadme.txt
// 
// 0 BFC CERTIFY CCW
  [0,"BFC","CERTIFY"],
  [0,"BFC","CCW"],
// 
// 0 !HISTORY 2002-03-23 [sbliss] Added BFC statement.
// 0 !HISTORY 2002-04-25 [PTadmin] Official Update 2002-02
// 0 !HISTORY 2007-06-22 [PTadmin] Header formatted for Contributor Agreement
// 0 !HISTORY 2008-07-01 [PTadmin] Official Update 2008-01
// 0 !HISTORY 2012-02-16 [Philo] Changed to CCW
// 0 !HISTORY 2012-03-30 [PTadmin] Official Update 2012-01
// 
// 
// 4 16 1 1 0 0.9239 1 0.3827 0.9239 0 0.3827 1 0 0
  [4,16,1,1,0,0.9239,1,0.3827,0.9239,0,0.3827,1,0,0],
// 5 24 1 0 0 1 1 0 0.9239 0 0.3827 1 0 -1
  [5,24,1,0,0,1,1,0,0.9239,0,0.3827,1,0,-1],
// 4 16 0.9239 1 0.3827 0.7071 1 0.7071 0.7071 0 0.7071 0.9239 0 0.3827
  [4,16,0.9239,1,0.3827,0.7071,1,0.7071,0.7071,0,0.7071,0.9239,0,0.3827],
// 5 24 0.9239 0 0.3827 0.9239 1 0.3827 0.7071 0 0.7071 1 0 0
  [5,24,0.9239,0,0.3827,0.9239,1,0.3827,0.7071,0,0.7071,1,0,0],
// 4 16 0.7071 1 0.7071 0.3827 1 0.9239 0.3827 0 0.9239 0.7071 0 0.7071
  [4,16,0.7071,1,0.7071,0.3827,1,0.9239,0.3827,0,0.9239,0.7071,0,0.7071],
// 5 24 0.7071 0 0.7071 0.7071 1 0.7071 0.3827 0 0.9239 0.9239 0 0.3827
  [5,24,0.7071,0,0.7071,0.7071,1,0.7071,0.3827,0,0.9239,0.9239,0,0.3827],
// 4 16 0.3827 1 0.9239 0 1 1 0 0 1 0.3827 0 0.9239
  [4,16,0.3827,1,0.9239,0,1,1,0,0,1,0.3827,0,0.9239],
// 5 24 0.3827 0 0.9239 0.3827 1 0.9239 0 0 1 0.7071 0 0.7071
  [5,24,0.3827,0,0.9239,0.3827,1,0.9239,0,0,1,0.7071,0,0.7071],
// 5 24 0 0 1 0 1 1 0.3827 0 0.9239 -1 0 1
  [5,24,0,0,1,0,1,1,0.3827,0,0.9239,-1,0,1],
];
module ldraw_lib__1_4cyli(step=0, col=false, unit=2/5, alt=false, line=0.2, solid=!$preview)
    makepoly(ldraw_lib__1_4cyli(), step=step, col=col, unit=unit, alt=alt, line=line, solid=solid);
ldraw_lib__1_4cyli(line=0.2);
// file: ../p/1-4chrd.scad
use <../lib.scad>
$fa=1; $fs=0.2;
function ldraw_lib__1_4chrd(realsolid=false) = [
// 0 Chord 0.25
// 0 Name: 1-4chrd.dat
// 0 Author: Tony Hafner [hafhead]
// 0 !LDRAW_ORG Primitive UPDATE 2012-02
// 0 !LICENSE Licensed under CC BY 2.0 and CC BY 4.0 : see CAreadme.txt
// 
// 0 BFC CERTIFY CCW
  [0,"BFC","CERTIFY"],
  [0,"BFC","CCW"],
// 
// 0 !HISTORY 2004-04-22 [PTadmin] Official Update 2004-02
// 0 !HISTORY 2007-10-09 [PTadmin] Header formatted for Contributor Agreement
// 0 !HISTORY 2008-07-01 [PTadmin] Official Update 2008-01
// 0 !HISTORY 2012-08-02 [MMR1988] Re-creation with PrimGen2 and Rectifier
// 0 !HISTORY 2012-08-09 [PTadmin] Official Update 2012-02
// 
// 
// 4 16 0.9239 0 0.3827 0.3827 0 0.9239 0 0 1 1 0 0
  [4,16,0.9239,0,0.3827,0.3827,0,0.9239,0,0,1,1,0,0],
// 3 16 0.7071 0 0.7071 0.3827 0 0.9239 0.9239 0 0.3827
  [3,16,0.7071,0,0.7071,0.3827,0,0.9239,0.9239,0,0.3827],
];
module ldraw_lib__1_4chrd(step=0, col=false, unit=2/5, alt=false, line=0.2, solid=!$preview)
    makepoly(ldraw_lib__1_4chrd(solid), step=step, col=col, unit=unit, alt=alt, line=line, solid=solid);
ldraw_lib__1_4chrd(line=0.2);
// file: 87079.scad
use <../lib.scad>
use <s/87079s01.scad>
function ldraw_lib__87079() = [
// 0 Tile  2 x  4 with Groove
// 0 Name: 87079.dat
// 0 Author: Tim Gould [timgould]
// 0 !LDRAW_ORG Part UPDATE 2012-03
// 0 !LICENSE Licensed under CC BY 4.0 : see CAreadme.txt
// 
// 0 BFC CERTIFY CCW
  [0,"BFC","CERTIFY"],
  [0,"BFC","CCW"],
// 
// 0 !HISTORY 2010-04-05 [PTadmin] Official Update 2010-01
// 0 !HISTORY 2012-09-30 [Philo] Subparted for patterns
// 0 !HISTORY 2012-12-28 [PTadmin] Official Update 2012-03
// 
// 
// 4 16 -40 0 -20 40 0 -20 40 0 20 -40 0 20
  [4,16,-40,0,-20,40,0,-20,40,0,20,-40,0,20],
// 1 16 0 0 0 1 0 0 0 1 0 0 0 1 s\87079s01.dat
  [1,16,0,0,0,1,0,0,0,1,0,0,0,1, ldraw_lib__s__87079s01()],
];
module ldraw_lib__87079(step=0, col=false, unit=2/5, alt=false, line=0.2, solid=!$preview)
    makepoly(ldraw_lib__87079(), step=step, col=col, unit=unit, alt=alt, line=line, solid=solid);
ldraw_lib__87079(line=0.2);
// file: 6148328r.scad
use <../lib.scad>
use <../p/1-4chrd.scad>
use <../p/1-4cyli.scad>
use <../p/box3u12.scad>
function ldraw_lib__6148328r() = [
// 0 Sticker  1.8 x  3.8 with Black Halftone Stripes on White Background (Needs Work)
// 0 Name: 6148328r.dat
// 0 Author: Massimo Maso [Sirio]
// 0 !LDRAW_ORG Part UPDATE 2024-05
// 0 !LICENSE Licensed under CC BY 4.0 : see CAreadme.txt
// 
// 0 !HELP Needs work: halftone stripes are approximate because no high-resolution images are available
// 
// 0 BFC CERTIFY CCW
  [0,"BFC","CERTIFY"],
  [0,"BFC","CCW"],
// 
// 0 !KEYWORDS 917K, 919, Bricklink 75876stk01, Brickowl 852010, Hybrid, Pit Lane
// 0 !KEYWORDS Rebrickable 26357, set 75876, Speed Champions
// 
// 0 !HISTORY 2024-06-30 [OrionP] Official Update 2024-05
// 
// 
// 0 // Textures
// 0 !TEXMAP START PLANAR -38 0 6.8 38 0 6.8 -38 0 2.8 6148328r.png
// 0 !: 4 15 -38 -.25 6.8 -38 -.25 2.8 38 -.25 2.8 38 -.25 6.8
// 0 !TEXMAP FALLBACK
// 
// 4 72 -38 -.25 6.8 -38 -.25 2.8 38 -.25 2.8 38 -.25 6.8
  [4,72,-38,-.25,6.8,-38,-.25,2.8,38,-.25,2.8,38,-.25,6.8],
// 0 !TEXMAP END
// 0 !TEXMAP START PLANAR -38 0 2 38 0 2 -38 0 -2 6148328r.png
// 0 !: 4 15 -38 -.25 2 -38 -.25 -2 38 -.25 -2 38 -.25 2
// 0 !TEXMAP FALLBACK
// 4 72 -38 -.25 2 -38 -.25 -2 38 -.25 -2 38 -.25 2
  [4,72,-38,-.25,2,-38,-.25,-2,38,-.25,-2,38,-.25,2],
// 0 !TEXMAP END
// 0 !TEXMAP START PLANAR -38 0 -2.8 38 0 -2.8 -38 0 -6.8 6148328r.png
// 0 !: 4 15 -38 -.25 -2.8 -38 -.25 -6.8 38 -.25 -6.8 38 -.25 -2.8
// 0 !TEXMAP FALLBACK
// 4 72 -38 -.25 -2.8 -38 -.25 -6.8 38 -.25 -6.8 38 -.25 -2.8
  [4,72,-38,-.25,-2.8,-38,-.25,-6.8,38,-.25,-6.8,38,-.25,-2.8],
// 0 !TEXMAP END
// 0 // Primitives
// 1 16 -36.5 0 16.5 -1.5 0 0 0 -1 0 0 0 1.5 1-4chrd.dat
  [1,16,-36.5,0,16.5,-1.5,0,0,0,-1,0,0,0,1.5, ldraw_lib__1_4chrd()],
// 1 16 36.5 0 16.5 1.5 0 0 0 -1 0 0 0 1.5 1-4chrd.dat
  [1,16,36.5,0,16.5,1.5,0,0,0,-1,0,0,0,1.5, ldraw_lib__1_4chrd()],
// 1 16 0 -.25 0 36.5 0 0 0 .25 0 0 0 18 box3u12.dat
  [1,16,0,-.25,0,36.5,0,0,0,.25,0,0,0,18, ldraw_lib__box3u12()],
// 1 16 -36.5 0 -16.5 -1.5 0 0 0 -1 0 0 0 -1.5 1-4chrd.dat
  [1,16,-36.5,0,-16.5,-1.5,0,0,0,-1,0,0,0,-1.5, ldraw_lib__1_4chrd()],
// 1 16 36.5 0 -16.5 1.5 0 0 0 -1 0 0 0 -1.5 1-4chrd.dat
  [1,16,36.5,0,-16.5,1.5,0,0,0,-1,0,0,0,-1.5, ldraw_lib__1_4chrd()],
// 1 16 -36.5 0 16.5 -1.5 0 0 0 -.25 0 0 0 1.5 1-4cyli.dat
  [1,16,-36.5,0,16.5,-1.5,0,0,0,-.25,0,0,0,1.5, ldraw_lib__1_4cyli()],
// 1 16 36.5 0 16.5 1.5 0 0 0 -.25 0 0 0 1.5 1-4cyli.dat
  [1,16,36.5,0,16.5,1.5,0,0,0,-.25,0,0,0,1.5, ldraw_lib__1_4cyli()],
// 1 16 -36.5 0 -16.5 -1.5 0 0 0 -.25 0 0 0 -1.5 1-4cyli.dat
  [1,16,-36.5,0,-16.5,-1.5,0,0,0,-.25,0,0,0,-1.5, ldraw_lib__1_4cyli()],
// 1 16 36.5 0 -16.5 1.5 0 0 0 -.25 0 0 0 -1.5 1-4cyli.dat
  [1,16,36.5,0,-16.5,1.5,0,0,0,-.25,0,0,0,-1.5, ldraw_lib__1_4cyli()],
// 1 15 -36.5 -.25 16.5 -1.5 0 0 0 1 0 0 0 1.5 1-4chrd.dat
  [1,15,-36.5,-.25,16.5,-1.5,0,0,0,1,0,0,0,1.5, ldraw_lib__1_4chrd()],
// 1 15 36.5 -.25 16.5 1.5 0 0 0 1 0 0 0 1.5 1-4chrd.dat
  [1,15,36.5,-.25,16.5,1.5,0,0,0,1,0,0,0,1.5, ldraw_lib__1_4chrd()],
// 1 15 -36.5 -.25 -16.5 -1.5 0 0 0 1 0 0 0 -1.5 1-4chrd.dat
  [1,15,-36.5,-.25,-16.5,-1.5,0,0,0,1,0,0,0,-1.5, ldraw_lib__1_4chrd()],
// 1 15 36.5 -.25 -16.5 1.5 0 0 0 1 0 0 0 -1.5 1-4chrd.dat
  [1,15,36.5,-.25,-16.5,1.5,0,0,0,1,0,0,0,-1.5, ldraw_lib__1_4chrd()],
// 0 // Bottom faces
// 4 16 -36.5 0 18 -36.5 0 -18 -38 0 -16.5 -38 0 16.5
  [4,16,-36.5,0,18,-36.5,0,-18,-38,0,-16.5,-38,0,16.5],
// 4 16 36.5 0 18 38 0 16.5 38 0 -16.5 36.5 0 -18
  [4,16,36.5,0,18,38,0,16.5,38,0,-16.5,36.5,0,-18],
// 0 // Lateral faces
// 3 16 -38 0 16.5 -38 -.25 6.8 -38 -.25 16.5
  [3,16,-38,0,16.5,-38,-.25,6.8,-38,-.25,16.5],
// 3 16 -38 0 16.5 -38 -.25 2.8 -38 -.25 6.8
  [3,16,-38,0,16.5,-38,-.25,2.8,-38,-.25,6.8],
// 3 16 -38 0 16.5 -38 -.25 2 -38 -.25 2.8
  [3,16,-38,0,16.5,-38,-.25,2,-38,-.25,2.8],
// 4 16 -38 0 16.5 -38 0 -16.5 -38 -.25 -2 -38 -.25 2
  [4,16,-38,0,16.5,-38,0,-16.5,-38,-.25,-2,-38,-.25,2],
// 3 16 -38 0 -16.5 -38 -.25 -2.8 -38 -.25 -2
  [3,16,-38,0,-16.5,-38,-.25,-2.8,-38,-.25,-2],
// 3 16 -38 0 -16.5 -38 -.25 -6.8 -38 -.25 -2.8
  [3,16,-38,0,-16.5,-38,-.25,-6.8,-38,-.25,-2.8],
// 3 16 -38 0 -16.5 -38 -.25 -16.5 -38 -.25 -6.8
  [3,16,-38,0,-16.5,-38,-.25,-16.5,-38,-.25,-6.8],
// 3 16 38 0 16.5 38 -.25 16.5 38 -.25 6.8
  [3,16,38,0,16.5,38,-.25,16.5,38,-.25,6.8],
// 3 16 38 0 16.5 38 -.25 6.8 38 -.25 2.8
  [3,16,38,0,16.5,38,-.25,6.8,38,-.25,2.8],
// 3 16 38 0 16.5 38 -.25 2.8 38 -.25 2
  [3,16,38,0,16.5,38,-.25,2.8,38,-.25,2],
// 4 16 38 0 16.5 38 -.25 2 38 -.25 -2 38 0 -16.5
  [4,16,38,0,16.5,38,-.25,2,38,-.25,-2,38,0,-16.5],
// 3 16 38 0 -16.5 38 -.25 -2 38 -.25 -2.8
  [3,16,38,0,-16.5,38,-.25,-2,38,-.25,-2.8],
// 3 16 38 0 -16.5 38 -.25 -2.8 38 -.25 -6.8
  [3,16,38,0,-16.5,38,-.25,-2.8,38,-.25,-6.8],
// 3 16 38 0 -16.5 38 -.25 -6.8 38 -.25 -16.5
  [3,16,38,0,-16.5,38,-.25,-6.8,38,-.25,-16.5],
// 0 // Top faces
// 4 15 -38 -.25 16.5 38 -.25 16.5 36.5 -.25 18 -36.5 -.25 18
  [4,15,-38,-.25,16.5,38,-.25,16.5,36.5,-.25,18,-36.5,-.25,18],
// 4 15 -38 -.25 16.5 -38 -.25 6.8 38 -.25 6.8 38 -.25 16.5
  [4,15,-38,-.25,16.5,-38,-.25,6.8,38,-.25,6.8,38,-.25,16.5],
// 4 15 -38 -.25 2.8 -38 -.25 2 38 -.25 2 38 -.25 2.8
  [4,15,-38,-.25,2.8,-38,-.25,2,38,-.25,2,38,-.25,2.8],
// 4 15 -38 -.25 -2 -38 -.25 -2.8 38 -.25 -2.8 38 -.25 -2
  [4,15,-38,-.25,-2,-38,-.25,-2.8,38,-.25,-2.8,38,-.25,-2],
// 4 15 -38 -.25 -16.5 38 -.25 -16.5 38 -.25 -6.8 -38 -.25 -6.8
  [4,15,-38,-.25,-16.5,38,-.25,-16.5,38,-.25,-6.8,-38,-.25,-6.8],
// 4 15 -38 -.25 -16.5 -36.5 -.25 -18 36.5 -.25 -18 38 -.25 -16.5
  [4,15,-38,-.25,-16.5,-36.5,-.25,-18,36.5,-.25,-18,38,-.25,-16.5],
];
module ldraw_lib__6148328r(step=0, col=false, unit=2/5, alt=false, line=0.2, solid=!$preview)
    makepoly(ldraw_lib__6148328r(), step=step, col=col, unit=unit, alt=alt, line=line, solid=solid);
ldraw_lib__6148328r(line=0.2);
// main file
use <../lib.scad>
use <6148328r.scad>
use <87079.scad>
function ldraw_lib__87079d11() = [
// 0 Tile  2 x  4 with Black Halftone Stripes on White Background Sticker
// 0 Name: 87079d11.dat
// 0 Author: Vincent Messenet [Cheenzo]
// 0 !LDRAW_ORG Shortcut UPDATE 2026-05
// 0 !LICENSE Licensed under CC BY 4.0 : see CAreadme.txt
// 
// 0 BFC CERTIFY CCW
  [0,"BFC","CERTIFY"],
  [0,"BFC","CCW"],
// 
// 0 !CATEGORY Sticker Shortcut
// 
// 0 !KEYWORDS Bricklink 87079pb0536, Porsche 919 Hybrid and 917K Pit Lane
// 0 !KEYWORDS set 75876, Speed Champions
// 
// 0 !HISTORY 2026-05-31 [OrionP] Official Update 2026-05
// 
// 1 16 0 0 0 1 0 0 0 1 0 0 0 1 87079.dat
  [1,16,0,0,0,1,0,0,0,1,0,0,0,1, ldraw_lib__87079()],
// 1 16 0 0 0 1 0 0 0 1 0 0 0 1 6148328r.dat
  [1,16,0,0,0,1,0,0,0,1,0,0,0,1, ldraw_lib__6148328r()],
];
module ldraw_lib__87079d11(step=0, col=false, unit=2/5, alt=false, line=0.2, solid=!$preview)
    makepoly(ldraw_lib__87079d11(), step=step, col=col, unit=unit, alt=alt, line=line, solid=solid);
ldraw_lib__87079d11(line=0.2);
